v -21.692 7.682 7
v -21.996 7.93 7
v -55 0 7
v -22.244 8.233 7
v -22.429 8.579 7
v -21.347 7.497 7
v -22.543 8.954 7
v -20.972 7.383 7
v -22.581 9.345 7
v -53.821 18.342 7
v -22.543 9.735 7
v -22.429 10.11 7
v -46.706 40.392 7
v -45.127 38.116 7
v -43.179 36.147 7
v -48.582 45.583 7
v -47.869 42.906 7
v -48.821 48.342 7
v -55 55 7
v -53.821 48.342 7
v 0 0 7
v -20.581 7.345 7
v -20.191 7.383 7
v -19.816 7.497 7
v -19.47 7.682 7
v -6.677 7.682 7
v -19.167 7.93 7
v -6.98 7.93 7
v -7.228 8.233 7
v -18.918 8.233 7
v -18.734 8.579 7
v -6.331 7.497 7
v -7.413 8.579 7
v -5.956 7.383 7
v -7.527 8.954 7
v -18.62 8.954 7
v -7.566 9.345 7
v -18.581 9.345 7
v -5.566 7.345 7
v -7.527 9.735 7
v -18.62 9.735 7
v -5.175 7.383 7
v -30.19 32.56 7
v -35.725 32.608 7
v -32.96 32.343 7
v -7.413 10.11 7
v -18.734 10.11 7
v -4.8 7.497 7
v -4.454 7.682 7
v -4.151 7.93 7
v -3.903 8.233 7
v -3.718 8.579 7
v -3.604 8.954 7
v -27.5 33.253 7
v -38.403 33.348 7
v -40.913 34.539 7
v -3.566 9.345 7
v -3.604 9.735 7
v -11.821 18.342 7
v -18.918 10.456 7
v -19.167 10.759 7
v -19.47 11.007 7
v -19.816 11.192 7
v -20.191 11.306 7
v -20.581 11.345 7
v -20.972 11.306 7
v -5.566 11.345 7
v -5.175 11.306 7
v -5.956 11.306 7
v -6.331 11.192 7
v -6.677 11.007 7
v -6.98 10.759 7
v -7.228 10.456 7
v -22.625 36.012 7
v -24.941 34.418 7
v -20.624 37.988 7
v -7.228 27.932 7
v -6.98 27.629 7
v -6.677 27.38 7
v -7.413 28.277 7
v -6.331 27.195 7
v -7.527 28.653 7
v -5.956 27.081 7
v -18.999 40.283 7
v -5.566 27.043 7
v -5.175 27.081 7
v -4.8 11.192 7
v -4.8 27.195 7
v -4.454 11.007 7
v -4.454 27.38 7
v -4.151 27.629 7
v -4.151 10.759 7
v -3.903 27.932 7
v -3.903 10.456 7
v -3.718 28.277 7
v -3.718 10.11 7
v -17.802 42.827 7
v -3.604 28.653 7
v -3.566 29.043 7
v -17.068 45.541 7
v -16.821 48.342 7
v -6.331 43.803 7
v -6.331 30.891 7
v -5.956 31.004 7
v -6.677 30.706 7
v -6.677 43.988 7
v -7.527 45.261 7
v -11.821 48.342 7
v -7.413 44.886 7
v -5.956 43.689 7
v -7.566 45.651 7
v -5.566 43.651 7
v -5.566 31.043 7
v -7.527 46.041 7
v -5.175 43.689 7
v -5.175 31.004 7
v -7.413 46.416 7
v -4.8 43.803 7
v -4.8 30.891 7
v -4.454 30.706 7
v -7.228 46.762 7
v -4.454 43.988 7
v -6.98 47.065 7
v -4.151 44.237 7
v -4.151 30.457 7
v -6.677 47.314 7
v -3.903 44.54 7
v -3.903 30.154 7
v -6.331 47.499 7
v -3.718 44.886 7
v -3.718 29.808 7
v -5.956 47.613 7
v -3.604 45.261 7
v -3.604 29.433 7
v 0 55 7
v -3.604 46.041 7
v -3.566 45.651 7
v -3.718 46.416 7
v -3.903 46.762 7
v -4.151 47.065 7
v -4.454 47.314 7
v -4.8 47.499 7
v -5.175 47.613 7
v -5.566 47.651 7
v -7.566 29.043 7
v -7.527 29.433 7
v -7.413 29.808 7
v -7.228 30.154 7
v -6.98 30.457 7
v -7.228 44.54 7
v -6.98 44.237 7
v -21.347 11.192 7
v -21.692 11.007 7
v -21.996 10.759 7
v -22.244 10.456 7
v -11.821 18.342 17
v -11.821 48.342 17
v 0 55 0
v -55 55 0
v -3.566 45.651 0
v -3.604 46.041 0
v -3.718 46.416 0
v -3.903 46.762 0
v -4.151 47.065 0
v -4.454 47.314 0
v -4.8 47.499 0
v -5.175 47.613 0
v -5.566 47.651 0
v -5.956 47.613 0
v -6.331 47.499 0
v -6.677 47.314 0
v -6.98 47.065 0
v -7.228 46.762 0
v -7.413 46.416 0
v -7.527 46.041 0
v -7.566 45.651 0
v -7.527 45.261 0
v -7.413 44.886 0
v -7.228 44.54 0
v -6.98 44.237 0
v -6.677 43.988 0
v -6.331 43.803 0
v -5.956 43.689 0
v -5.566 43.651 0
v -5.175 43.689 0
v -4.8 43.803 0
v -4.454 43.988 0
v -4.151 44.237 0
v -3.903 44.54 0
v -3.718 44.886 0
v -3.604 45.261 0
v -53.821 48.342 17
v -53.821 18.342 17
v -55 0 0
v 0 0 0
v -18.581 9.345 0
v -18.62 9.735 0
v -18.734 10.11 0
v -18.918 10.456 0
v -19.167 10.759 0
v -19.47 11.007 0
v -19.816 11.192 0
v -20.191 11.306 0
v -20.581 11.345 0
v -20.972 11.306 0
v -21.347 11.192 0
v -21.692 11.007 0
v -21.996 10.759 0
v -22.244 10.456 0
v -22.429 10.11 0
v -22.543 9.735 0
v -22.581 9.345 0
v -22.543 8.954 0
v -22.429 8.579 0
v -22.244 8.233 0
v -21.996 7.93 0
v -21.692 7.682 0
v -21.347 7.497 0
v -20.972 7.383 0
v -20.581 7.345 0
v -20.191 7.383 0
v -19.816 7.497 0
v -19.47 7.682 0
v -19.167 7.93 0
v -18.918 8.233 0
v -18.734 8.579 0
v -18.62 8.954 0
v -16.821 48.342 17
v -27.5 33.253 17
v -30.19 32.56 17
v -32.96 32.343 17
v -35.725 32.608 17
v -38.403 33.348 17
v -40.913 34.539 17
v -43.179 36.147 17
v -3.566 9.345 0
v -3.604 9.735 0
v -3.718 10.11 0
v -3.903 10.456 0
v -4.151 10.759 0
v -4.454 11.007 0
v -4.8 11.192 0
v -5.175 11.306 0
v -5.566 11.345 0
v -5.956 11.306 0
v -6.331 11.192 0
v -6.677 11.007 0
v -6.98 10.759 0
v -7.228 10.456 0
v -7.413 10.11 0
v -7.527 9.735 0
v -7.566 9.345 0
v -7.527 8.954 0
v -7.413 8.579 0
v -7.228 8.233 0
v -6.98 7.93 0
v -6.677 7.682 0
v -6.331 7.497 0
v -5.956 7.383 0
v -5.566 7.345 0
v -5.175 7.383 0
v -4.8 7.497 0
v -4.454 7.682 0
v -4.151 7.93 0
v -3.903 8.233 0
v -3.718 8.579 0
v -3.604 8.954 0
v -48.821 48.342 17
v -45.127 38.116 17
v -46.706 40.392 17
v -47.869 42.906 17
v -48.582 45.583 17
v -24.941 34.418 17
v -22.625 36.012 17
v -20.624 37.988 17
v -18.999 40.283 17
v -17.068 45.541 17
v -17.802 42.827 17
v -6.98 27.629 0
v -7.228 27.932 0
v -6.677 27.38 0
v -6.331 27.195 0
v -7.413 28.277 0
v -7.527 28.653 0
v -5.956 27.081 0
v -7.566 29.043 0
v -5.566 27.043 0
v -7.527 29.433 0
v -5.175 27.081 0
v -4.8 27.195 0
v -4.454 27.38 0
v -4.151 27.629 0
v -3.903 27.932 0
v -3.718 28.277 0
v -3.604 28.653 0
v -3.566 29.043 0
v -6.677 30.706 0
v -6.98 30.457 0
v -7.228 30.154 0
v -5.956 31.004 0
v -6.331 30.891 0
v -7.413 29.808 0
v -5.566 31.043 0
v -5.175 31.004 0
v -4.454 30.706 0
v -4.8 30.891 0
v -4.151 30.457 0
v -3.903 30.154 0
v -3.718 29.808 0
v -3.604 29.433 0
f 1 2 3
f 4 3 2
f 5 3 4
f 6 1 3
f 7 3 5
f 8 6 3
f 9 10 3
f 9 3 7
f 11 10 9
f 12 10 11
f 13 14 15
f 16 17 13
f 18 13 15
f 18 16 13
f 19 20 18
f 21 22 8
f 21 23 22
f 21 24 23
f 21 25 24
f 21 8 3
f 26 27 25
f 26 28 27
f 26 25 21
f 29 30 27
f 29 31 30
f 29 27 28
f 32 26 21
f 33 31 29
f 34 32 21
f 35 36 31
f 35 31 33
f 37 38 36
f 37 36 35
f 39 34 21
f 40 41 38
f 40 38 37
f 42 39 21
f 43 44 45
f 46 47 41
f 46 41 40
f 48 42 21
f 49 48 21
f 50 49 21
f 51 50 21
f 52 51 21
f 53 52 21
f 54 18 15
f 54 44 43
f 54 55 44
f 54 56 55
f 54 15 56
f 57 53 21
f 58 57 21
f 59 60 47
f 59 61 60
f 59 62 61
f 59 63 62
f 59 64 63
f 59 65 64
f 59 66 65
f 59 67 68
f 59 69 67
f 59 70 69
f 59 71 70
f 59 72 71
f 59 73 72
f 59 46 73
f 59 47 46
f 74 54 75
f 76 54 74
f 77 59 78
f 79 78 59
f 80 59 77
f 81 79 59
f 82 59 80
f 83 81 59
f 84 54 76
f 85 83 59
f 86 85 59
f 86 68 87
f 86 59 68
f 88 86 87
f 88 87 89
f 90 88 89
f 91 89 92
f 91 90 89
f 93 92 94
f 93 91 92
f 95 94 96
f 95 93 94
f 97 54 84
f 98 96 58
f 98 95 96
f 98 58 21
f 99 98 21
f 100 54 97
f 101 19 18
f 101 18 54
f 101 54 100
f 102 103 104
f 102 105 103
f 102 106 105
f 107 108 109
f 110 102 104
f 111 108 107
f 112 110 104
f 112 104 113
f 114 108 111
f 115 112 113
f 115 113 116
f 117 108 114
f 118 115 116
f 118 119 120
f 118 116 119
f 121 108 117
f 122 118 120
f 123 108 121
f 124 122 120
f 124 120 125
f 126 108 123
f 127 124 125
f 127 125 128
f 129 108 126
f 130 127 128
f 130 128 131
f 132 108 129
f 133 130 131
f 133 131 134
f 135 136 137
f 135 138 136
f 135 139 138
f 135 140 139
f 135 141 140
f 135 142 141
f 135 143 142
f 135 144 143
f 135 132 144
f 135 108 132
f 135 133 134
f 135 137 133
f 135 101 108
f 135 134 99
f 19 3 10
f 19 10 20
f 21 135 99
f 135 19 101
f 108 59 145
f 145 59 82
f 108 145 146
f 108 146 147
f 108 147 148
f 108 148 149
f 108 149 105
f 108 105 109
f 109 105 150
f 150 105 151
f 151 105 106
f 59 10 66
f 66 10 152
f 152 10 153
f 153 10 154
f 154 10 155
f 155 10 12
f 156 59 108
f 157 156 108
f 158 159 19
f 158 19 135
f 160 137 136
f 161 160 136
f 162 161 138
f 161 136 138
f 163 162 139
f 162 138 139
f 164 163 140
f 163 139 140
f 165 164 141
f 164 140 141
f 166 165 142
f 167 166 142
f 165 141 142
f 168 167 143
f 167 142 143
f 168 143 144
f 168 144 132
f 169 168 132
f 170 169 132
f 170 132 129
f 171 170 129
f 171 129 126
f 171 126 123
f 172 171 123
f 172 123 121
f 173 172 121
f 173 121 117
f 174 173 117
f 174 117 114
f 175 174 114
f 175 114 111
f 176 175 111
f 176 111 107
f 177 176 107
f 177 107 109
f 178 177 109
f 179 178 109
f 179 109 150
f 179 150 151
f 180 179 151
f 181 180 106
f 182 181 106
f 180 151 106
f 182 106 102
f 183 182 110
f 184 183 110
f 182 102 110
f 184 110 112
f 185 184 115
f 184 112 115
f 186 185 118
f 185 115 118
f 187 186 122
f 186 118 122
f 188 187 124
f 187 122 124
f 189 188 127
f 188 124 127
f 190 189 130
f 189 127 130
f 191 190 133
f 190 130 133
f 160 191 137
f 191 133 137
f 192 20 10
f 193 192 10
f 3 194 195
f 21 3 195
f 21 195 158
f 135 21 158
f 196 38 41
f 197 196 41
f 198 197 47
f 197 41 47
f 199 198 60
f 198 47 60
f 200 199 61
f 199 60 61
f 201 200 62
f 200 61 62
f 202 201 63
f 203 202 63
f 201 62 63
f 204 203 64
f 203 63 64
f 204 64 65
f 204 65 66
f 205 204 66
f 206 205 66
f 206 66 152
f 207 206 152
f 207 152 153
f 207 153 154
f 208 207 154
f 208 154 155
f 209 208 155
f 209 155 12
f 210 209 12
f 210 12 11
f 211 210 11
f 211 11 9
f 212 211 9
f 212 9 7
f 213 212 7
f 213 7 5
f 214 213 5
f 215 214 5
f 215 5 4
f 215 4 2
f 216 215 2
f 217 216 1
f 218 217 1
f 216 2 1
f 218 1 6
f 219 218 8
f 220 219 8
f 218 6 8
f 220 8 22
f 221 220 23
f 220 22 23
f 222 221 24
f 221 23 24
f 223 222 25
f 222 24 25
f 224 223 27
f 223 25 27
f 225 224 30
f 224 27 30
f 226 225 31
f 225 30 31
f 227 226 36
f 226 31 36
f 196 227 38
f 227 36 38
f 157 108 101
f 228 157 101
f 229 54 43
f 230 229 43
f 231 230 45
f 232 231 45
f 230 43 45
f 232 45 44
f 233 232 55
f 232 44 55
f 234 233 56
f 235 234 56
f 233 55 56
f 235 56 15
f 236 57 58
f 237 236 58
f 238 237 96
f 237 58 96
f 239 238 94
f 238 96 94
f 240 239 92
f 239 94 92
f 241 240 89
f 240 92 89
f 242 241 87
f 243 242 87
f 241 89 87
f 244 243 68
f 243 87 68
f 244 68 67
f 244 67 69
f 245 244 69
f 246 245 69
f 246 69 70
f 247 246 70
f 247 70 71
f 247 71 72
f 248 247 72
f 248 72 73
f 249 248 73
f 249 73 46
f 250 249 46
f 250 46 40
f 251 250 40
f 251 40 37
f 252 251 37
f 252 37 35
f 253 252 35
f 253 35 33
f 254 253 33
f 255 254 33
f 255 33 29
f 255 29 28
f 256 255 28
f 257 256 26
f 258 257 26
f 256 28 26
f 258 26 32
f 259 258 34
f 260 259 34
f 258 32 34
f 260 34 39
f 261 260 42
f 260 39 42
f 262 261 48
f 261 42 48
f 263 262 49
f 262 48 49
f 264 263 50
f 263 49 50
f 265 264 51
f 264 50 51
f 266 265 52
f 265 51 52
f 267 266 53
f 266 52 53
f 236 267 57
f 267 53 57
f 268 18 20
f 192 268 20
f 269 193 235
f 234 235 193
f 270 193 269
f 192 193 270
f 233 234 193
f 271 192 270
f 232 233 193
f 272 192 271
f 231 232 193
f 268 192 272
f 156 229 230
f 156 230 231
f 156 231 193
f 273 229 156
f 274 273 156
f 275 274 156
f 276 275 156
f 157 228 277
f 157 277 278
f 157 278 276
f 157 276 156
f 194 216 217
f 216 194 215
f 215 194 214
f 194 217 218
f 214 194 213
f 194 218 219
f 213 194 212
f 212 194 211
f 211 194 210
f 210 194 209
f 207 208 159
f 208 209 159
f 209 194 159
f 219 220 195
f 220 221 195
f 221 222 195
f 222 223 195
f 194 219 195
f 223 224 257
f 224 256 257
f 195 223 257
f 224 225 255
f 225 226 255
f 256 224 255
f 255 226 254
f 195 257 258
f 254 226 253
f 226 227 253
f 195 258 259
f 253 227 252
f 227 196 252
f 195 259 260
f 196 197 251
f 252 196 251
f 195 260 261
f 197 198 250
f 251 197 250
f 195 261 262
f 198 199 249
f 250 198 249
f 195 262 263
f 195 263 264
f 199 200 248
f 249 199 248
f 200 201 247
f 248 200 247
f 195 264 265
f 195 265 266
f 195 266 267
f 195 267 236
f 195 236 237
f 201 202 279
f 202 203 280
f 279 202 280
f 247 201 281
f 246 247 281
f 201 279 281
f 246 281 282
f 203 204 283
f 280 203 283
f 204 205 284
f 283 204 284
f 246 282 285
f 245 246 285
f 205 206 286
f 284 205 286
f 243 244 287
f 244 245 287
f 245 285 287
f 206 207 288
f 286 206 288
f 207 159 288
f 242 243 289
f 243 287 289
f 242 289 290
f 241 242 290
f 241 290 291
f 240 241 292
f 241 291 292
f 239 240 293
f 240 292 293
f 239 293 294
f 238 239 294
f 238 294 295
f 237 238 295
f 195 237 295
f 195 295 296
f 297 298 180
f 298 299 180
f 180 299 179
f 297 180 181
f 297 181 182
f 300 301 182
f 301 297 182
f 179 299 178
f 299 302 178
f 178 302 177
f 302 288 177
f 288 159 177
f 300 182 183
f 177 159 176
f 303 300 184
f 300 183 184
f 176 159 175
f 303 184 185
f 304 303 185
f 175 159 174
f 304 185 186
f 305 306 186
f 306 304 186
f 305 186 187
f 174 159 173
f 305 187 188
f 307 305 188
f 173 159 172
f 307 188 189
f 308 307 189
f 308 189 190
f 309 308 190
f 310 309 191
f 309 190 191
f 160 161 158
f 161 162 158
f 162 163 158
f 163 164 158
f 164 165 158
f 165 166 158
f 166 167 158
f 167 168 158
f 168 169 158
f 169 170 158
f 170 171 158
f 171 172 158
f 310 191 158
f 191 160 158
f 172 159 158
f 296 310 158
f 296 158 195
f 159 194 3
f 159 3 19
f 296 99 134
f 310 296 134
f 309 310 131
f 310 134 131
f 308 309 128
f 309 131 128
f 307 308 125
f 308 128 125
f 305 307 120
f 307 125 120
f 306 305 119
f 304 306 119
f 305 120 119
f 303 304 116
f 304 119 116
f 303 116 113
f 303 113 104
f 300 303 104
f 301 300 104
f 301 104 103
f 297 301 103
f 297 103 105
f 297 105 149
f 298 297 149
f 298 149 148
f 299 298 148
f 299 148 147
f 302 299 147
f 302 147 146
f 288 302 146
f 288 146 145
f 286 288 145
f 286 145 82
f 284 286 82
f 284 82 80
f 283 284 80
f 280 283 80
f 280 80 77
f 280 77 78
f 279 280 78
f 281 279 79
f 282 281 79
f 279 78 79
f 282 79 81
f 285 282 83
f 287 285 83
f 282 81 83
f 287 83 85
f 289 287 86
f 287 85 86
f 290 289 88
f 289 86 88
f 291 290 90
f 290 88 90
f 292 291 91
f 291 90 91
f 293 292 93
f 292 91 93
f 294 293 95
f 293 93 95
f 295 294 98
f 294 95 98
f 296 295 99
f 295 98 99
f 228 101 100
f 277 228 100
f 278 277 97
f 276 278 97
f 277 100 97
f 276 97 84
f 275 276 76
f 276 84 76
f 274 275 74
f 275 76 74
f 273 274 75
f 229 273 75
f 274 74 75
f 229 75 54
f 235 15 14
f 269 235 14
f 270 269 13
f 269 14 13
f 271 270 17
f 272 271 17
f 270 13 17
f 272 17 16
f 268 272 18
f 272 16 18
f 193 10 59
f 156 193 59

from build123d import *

# Parameters (mm, degrees)
F0_W     = 55
F0_H     = 55
F1_DEPTH = 7
F4_DEPTH = 10
F3_R     = 2
F5_DEPTH = 7.001


with BuildPart() as f1:
    # F0 (on Top) → F1 (new body)
    with BuildSketch(Plane.XY):
        with Locations((-27.5, 27.5)):
            Rectangle(F0_W, F0_H)
    extrude(amount=F1_DEPTH)

    # F2 (on face) → F4 (join)
    with BuildSketch(Plane.XY.offset(7)):
        with BuildLine():
            Line((-43.1786440313, 18.3423049748), (-43.1786440313, 36.1469540578))
            ThreePointArc((-43.1786440313, 36.1469540578), (-47.3423168357, 41.6235479841), (-48.8213559687, 48.3423049748))
            Line((-48.8213559687, 48.3423049748), (-53.8213559687, 48.3423049748))
            Line((-53.8213559687, 48.3423049748), (-53.8213559687, 18.3423049748))
            Line((-53.8213559687, 18.3423049748), (-43.1786440313, 18.3423049748))
        make_face()
        with BuildLine():
            Line((-27.5, 18.3423049748), (-27.5, 33.2531310195))
            ThreePointArc((-27.5, 33.2531310195), (-35.7254403266, 32.6080654303), (-43.1786440313, 36.1469540578))
            Line((-43.1786440313, 36.1469540578), (-43.1786440313, 18.3423049748))
            Line((-43.1786440313, 18.3423049748), (-27.5, 18.3423049748))
        make_face()
        with BuildLine():
            ThreePointArc((-16.8213559687, 48.3423049748), (-19.7610784927, 39.0995157718), (-27.5, 33.2531310195))
            ThreePointArc((-27.5, 33.2531310195), (-19.2745596734, 32.6080654303), (-11.8213559687, 36.1469540578))
            Line((-11.8213559687, 36.1469540578), (-11.8213559687, 48.3423049748))
            Line((-11.8213559687, 48.3423049748), (-16.8213559687, 48.3423049748))
        make_face()
        with BuildLine():
            ThreePointArc((-11.8213559687, 36.1469540578), (-19.2745596734, 32.6080654303), (-27.5, 33.2531310195))
            Line((-27.5, 33.2531310195), (-27.5, 18.3423049748))
            Line((-27.5, 18.3423049748), (-11.8213559687, 18.3423049748))
            Line((-11.8213559687, 18.3423049748), (-11.8213559687, 36.1469540578))
        make_face()
    extrude(amount=F4_DEPTH)

    # F3 (on face) → F5 (cut, through all)
    with BuildSketch(Plane.XY.offset(7)):
        with Locations((-20.5813342872, 9.34450762)):
            Circle(F3_R)
        with Locations((-5.5655137111, 9.34450762)):
            Circle(F3_R)
        with Locations((-5.5655137111, 29.042776674)):
            Circle(F3_R)
        with Locations((-5.5655137111, 45.6509888542)):
            Circle(F3_R)
    extrude(amount=-F5_DEPTH, mode=Mode.SUBTRACT)


solid = f1.part
